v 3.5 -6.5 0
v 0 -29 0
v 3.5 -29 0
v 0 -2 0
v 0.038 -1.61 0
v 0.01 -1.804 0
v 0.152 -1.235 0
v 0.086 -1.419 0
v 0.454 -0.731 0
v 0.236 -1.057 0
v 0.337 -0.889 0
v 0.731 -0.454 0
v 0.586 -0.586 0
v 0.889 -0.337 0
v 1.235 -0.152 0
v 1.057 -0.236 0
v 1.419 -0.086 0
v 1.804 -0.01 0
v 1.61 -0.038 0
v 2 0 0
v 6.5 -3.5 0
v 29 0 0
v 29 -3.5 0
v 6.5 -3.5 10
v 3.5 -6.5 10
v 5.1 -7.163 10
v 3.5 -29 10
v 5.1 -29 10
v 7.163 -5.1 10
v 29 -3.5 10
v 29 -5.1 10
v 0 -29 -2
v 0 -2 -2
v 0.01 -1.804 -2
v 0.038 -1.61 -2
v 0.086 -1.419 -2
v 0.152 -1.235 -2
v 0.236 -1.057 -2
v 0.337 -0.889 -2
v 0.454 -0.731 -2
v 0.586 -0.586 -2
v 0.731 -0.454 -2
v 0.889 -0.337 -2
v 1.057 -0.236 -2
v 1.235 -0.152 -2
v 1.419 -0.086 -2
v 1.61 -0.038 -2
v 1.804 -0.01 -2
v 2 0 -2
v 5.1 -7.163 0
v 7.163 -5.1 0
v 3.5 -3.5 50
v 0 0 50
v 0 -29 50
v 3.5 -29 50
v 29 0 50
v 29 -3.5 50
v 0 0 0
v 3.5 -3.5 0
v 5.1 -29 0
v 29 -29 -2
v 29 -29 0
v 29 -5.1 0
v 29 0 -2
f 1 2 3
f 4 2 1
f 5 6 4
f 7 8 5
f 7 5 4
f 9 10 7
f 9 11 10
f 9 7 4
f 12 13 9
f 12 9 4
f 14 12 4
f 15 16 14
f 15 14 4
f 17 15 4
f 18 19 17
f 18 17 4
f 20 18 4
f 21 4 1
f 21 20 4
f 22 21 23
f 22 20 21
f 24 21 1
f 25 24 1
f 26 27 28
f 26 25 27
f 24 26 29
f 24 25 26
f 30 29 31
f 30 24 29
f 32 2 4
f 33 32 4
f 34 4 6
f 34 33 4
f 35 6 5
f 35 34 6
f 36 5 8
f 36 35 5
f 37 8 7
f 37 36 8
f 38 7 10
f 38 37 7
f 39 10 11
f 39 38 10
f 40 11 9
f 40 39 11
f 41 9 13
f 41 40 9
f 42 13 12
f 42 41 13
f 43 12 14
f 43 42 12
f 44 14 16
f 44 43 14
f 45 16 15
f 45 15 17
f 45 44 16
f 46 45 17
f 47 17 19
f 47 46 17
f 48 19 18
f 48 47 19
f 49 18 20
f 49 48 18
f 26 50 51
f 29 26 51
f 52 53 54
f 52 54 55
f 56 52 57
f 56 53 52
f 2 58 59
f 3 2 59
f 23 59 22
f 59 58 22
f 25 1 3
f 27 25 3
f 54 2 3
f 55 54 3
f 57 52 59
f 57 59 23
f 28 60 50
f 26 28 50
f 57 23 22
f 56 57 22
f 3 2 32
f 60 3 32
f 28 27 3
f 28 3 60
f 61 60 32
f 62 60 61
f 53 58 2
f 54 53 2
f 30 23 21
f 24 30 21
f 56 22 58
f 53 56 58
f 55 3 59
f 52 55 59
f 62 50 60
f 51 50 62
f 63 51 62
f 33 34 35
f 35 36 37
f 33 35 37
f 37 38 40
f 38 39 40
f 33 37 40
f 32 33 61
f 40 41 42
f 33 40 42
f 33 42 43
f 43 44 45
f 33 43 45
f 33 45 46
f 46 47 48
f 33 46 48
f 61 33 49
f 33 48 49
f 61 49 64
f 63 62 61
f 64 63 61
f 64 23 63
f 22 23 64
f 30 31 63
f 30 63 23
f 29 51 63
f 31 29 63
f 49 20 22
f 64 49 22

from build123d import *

# Parameters (mm, degrees)
F1_DEPTH = 50
F2_W     = 29
F2_H     = 29
F3_DEPTH = 2
F5_DEPTH = 10
F6_R     = 2


with BuildPart() as f1:
    # F0 (on Top) → F1 (new body)
    with BuildSketch(Plane.XY):
        Polygon((29, 0), (0, 0), (0, -29), (3.5, -29), (3.5, -3.5), (29, -3.5), align=None)
    extrude(amount=F1_DEPTH)


with BuildPart() as f3:
    # F2 (on Top) → F3 (new body)
    with BuildSketch(Plane.XY):
        with Locations((14.5, -14.5)):
            Rectangle(F2_W, F2_H)
    extrude(amount=-F3_DEPTH)

    # F4 (on face) → F5 (join)
    with BuildSketch(Plane.XY):
        Polygon((3.5, -29), (5.1, -29), (5.1, -7.1627416998), (7.1627416998, -5.1), (29, -5.1), (29, -3.5), (6.5, -3.5), (3.5, -6.5), align=None)
    extrude(amount=F5_DEPTH)

    # F6
    f6_edges = [f3.edges().sort_by_distance(p)[0] for p in [
        (0, 0, -1),
    ]]
    fillet(f6_edges, radius=F6_R)


solid = Compound([f1.part, f3.part])
